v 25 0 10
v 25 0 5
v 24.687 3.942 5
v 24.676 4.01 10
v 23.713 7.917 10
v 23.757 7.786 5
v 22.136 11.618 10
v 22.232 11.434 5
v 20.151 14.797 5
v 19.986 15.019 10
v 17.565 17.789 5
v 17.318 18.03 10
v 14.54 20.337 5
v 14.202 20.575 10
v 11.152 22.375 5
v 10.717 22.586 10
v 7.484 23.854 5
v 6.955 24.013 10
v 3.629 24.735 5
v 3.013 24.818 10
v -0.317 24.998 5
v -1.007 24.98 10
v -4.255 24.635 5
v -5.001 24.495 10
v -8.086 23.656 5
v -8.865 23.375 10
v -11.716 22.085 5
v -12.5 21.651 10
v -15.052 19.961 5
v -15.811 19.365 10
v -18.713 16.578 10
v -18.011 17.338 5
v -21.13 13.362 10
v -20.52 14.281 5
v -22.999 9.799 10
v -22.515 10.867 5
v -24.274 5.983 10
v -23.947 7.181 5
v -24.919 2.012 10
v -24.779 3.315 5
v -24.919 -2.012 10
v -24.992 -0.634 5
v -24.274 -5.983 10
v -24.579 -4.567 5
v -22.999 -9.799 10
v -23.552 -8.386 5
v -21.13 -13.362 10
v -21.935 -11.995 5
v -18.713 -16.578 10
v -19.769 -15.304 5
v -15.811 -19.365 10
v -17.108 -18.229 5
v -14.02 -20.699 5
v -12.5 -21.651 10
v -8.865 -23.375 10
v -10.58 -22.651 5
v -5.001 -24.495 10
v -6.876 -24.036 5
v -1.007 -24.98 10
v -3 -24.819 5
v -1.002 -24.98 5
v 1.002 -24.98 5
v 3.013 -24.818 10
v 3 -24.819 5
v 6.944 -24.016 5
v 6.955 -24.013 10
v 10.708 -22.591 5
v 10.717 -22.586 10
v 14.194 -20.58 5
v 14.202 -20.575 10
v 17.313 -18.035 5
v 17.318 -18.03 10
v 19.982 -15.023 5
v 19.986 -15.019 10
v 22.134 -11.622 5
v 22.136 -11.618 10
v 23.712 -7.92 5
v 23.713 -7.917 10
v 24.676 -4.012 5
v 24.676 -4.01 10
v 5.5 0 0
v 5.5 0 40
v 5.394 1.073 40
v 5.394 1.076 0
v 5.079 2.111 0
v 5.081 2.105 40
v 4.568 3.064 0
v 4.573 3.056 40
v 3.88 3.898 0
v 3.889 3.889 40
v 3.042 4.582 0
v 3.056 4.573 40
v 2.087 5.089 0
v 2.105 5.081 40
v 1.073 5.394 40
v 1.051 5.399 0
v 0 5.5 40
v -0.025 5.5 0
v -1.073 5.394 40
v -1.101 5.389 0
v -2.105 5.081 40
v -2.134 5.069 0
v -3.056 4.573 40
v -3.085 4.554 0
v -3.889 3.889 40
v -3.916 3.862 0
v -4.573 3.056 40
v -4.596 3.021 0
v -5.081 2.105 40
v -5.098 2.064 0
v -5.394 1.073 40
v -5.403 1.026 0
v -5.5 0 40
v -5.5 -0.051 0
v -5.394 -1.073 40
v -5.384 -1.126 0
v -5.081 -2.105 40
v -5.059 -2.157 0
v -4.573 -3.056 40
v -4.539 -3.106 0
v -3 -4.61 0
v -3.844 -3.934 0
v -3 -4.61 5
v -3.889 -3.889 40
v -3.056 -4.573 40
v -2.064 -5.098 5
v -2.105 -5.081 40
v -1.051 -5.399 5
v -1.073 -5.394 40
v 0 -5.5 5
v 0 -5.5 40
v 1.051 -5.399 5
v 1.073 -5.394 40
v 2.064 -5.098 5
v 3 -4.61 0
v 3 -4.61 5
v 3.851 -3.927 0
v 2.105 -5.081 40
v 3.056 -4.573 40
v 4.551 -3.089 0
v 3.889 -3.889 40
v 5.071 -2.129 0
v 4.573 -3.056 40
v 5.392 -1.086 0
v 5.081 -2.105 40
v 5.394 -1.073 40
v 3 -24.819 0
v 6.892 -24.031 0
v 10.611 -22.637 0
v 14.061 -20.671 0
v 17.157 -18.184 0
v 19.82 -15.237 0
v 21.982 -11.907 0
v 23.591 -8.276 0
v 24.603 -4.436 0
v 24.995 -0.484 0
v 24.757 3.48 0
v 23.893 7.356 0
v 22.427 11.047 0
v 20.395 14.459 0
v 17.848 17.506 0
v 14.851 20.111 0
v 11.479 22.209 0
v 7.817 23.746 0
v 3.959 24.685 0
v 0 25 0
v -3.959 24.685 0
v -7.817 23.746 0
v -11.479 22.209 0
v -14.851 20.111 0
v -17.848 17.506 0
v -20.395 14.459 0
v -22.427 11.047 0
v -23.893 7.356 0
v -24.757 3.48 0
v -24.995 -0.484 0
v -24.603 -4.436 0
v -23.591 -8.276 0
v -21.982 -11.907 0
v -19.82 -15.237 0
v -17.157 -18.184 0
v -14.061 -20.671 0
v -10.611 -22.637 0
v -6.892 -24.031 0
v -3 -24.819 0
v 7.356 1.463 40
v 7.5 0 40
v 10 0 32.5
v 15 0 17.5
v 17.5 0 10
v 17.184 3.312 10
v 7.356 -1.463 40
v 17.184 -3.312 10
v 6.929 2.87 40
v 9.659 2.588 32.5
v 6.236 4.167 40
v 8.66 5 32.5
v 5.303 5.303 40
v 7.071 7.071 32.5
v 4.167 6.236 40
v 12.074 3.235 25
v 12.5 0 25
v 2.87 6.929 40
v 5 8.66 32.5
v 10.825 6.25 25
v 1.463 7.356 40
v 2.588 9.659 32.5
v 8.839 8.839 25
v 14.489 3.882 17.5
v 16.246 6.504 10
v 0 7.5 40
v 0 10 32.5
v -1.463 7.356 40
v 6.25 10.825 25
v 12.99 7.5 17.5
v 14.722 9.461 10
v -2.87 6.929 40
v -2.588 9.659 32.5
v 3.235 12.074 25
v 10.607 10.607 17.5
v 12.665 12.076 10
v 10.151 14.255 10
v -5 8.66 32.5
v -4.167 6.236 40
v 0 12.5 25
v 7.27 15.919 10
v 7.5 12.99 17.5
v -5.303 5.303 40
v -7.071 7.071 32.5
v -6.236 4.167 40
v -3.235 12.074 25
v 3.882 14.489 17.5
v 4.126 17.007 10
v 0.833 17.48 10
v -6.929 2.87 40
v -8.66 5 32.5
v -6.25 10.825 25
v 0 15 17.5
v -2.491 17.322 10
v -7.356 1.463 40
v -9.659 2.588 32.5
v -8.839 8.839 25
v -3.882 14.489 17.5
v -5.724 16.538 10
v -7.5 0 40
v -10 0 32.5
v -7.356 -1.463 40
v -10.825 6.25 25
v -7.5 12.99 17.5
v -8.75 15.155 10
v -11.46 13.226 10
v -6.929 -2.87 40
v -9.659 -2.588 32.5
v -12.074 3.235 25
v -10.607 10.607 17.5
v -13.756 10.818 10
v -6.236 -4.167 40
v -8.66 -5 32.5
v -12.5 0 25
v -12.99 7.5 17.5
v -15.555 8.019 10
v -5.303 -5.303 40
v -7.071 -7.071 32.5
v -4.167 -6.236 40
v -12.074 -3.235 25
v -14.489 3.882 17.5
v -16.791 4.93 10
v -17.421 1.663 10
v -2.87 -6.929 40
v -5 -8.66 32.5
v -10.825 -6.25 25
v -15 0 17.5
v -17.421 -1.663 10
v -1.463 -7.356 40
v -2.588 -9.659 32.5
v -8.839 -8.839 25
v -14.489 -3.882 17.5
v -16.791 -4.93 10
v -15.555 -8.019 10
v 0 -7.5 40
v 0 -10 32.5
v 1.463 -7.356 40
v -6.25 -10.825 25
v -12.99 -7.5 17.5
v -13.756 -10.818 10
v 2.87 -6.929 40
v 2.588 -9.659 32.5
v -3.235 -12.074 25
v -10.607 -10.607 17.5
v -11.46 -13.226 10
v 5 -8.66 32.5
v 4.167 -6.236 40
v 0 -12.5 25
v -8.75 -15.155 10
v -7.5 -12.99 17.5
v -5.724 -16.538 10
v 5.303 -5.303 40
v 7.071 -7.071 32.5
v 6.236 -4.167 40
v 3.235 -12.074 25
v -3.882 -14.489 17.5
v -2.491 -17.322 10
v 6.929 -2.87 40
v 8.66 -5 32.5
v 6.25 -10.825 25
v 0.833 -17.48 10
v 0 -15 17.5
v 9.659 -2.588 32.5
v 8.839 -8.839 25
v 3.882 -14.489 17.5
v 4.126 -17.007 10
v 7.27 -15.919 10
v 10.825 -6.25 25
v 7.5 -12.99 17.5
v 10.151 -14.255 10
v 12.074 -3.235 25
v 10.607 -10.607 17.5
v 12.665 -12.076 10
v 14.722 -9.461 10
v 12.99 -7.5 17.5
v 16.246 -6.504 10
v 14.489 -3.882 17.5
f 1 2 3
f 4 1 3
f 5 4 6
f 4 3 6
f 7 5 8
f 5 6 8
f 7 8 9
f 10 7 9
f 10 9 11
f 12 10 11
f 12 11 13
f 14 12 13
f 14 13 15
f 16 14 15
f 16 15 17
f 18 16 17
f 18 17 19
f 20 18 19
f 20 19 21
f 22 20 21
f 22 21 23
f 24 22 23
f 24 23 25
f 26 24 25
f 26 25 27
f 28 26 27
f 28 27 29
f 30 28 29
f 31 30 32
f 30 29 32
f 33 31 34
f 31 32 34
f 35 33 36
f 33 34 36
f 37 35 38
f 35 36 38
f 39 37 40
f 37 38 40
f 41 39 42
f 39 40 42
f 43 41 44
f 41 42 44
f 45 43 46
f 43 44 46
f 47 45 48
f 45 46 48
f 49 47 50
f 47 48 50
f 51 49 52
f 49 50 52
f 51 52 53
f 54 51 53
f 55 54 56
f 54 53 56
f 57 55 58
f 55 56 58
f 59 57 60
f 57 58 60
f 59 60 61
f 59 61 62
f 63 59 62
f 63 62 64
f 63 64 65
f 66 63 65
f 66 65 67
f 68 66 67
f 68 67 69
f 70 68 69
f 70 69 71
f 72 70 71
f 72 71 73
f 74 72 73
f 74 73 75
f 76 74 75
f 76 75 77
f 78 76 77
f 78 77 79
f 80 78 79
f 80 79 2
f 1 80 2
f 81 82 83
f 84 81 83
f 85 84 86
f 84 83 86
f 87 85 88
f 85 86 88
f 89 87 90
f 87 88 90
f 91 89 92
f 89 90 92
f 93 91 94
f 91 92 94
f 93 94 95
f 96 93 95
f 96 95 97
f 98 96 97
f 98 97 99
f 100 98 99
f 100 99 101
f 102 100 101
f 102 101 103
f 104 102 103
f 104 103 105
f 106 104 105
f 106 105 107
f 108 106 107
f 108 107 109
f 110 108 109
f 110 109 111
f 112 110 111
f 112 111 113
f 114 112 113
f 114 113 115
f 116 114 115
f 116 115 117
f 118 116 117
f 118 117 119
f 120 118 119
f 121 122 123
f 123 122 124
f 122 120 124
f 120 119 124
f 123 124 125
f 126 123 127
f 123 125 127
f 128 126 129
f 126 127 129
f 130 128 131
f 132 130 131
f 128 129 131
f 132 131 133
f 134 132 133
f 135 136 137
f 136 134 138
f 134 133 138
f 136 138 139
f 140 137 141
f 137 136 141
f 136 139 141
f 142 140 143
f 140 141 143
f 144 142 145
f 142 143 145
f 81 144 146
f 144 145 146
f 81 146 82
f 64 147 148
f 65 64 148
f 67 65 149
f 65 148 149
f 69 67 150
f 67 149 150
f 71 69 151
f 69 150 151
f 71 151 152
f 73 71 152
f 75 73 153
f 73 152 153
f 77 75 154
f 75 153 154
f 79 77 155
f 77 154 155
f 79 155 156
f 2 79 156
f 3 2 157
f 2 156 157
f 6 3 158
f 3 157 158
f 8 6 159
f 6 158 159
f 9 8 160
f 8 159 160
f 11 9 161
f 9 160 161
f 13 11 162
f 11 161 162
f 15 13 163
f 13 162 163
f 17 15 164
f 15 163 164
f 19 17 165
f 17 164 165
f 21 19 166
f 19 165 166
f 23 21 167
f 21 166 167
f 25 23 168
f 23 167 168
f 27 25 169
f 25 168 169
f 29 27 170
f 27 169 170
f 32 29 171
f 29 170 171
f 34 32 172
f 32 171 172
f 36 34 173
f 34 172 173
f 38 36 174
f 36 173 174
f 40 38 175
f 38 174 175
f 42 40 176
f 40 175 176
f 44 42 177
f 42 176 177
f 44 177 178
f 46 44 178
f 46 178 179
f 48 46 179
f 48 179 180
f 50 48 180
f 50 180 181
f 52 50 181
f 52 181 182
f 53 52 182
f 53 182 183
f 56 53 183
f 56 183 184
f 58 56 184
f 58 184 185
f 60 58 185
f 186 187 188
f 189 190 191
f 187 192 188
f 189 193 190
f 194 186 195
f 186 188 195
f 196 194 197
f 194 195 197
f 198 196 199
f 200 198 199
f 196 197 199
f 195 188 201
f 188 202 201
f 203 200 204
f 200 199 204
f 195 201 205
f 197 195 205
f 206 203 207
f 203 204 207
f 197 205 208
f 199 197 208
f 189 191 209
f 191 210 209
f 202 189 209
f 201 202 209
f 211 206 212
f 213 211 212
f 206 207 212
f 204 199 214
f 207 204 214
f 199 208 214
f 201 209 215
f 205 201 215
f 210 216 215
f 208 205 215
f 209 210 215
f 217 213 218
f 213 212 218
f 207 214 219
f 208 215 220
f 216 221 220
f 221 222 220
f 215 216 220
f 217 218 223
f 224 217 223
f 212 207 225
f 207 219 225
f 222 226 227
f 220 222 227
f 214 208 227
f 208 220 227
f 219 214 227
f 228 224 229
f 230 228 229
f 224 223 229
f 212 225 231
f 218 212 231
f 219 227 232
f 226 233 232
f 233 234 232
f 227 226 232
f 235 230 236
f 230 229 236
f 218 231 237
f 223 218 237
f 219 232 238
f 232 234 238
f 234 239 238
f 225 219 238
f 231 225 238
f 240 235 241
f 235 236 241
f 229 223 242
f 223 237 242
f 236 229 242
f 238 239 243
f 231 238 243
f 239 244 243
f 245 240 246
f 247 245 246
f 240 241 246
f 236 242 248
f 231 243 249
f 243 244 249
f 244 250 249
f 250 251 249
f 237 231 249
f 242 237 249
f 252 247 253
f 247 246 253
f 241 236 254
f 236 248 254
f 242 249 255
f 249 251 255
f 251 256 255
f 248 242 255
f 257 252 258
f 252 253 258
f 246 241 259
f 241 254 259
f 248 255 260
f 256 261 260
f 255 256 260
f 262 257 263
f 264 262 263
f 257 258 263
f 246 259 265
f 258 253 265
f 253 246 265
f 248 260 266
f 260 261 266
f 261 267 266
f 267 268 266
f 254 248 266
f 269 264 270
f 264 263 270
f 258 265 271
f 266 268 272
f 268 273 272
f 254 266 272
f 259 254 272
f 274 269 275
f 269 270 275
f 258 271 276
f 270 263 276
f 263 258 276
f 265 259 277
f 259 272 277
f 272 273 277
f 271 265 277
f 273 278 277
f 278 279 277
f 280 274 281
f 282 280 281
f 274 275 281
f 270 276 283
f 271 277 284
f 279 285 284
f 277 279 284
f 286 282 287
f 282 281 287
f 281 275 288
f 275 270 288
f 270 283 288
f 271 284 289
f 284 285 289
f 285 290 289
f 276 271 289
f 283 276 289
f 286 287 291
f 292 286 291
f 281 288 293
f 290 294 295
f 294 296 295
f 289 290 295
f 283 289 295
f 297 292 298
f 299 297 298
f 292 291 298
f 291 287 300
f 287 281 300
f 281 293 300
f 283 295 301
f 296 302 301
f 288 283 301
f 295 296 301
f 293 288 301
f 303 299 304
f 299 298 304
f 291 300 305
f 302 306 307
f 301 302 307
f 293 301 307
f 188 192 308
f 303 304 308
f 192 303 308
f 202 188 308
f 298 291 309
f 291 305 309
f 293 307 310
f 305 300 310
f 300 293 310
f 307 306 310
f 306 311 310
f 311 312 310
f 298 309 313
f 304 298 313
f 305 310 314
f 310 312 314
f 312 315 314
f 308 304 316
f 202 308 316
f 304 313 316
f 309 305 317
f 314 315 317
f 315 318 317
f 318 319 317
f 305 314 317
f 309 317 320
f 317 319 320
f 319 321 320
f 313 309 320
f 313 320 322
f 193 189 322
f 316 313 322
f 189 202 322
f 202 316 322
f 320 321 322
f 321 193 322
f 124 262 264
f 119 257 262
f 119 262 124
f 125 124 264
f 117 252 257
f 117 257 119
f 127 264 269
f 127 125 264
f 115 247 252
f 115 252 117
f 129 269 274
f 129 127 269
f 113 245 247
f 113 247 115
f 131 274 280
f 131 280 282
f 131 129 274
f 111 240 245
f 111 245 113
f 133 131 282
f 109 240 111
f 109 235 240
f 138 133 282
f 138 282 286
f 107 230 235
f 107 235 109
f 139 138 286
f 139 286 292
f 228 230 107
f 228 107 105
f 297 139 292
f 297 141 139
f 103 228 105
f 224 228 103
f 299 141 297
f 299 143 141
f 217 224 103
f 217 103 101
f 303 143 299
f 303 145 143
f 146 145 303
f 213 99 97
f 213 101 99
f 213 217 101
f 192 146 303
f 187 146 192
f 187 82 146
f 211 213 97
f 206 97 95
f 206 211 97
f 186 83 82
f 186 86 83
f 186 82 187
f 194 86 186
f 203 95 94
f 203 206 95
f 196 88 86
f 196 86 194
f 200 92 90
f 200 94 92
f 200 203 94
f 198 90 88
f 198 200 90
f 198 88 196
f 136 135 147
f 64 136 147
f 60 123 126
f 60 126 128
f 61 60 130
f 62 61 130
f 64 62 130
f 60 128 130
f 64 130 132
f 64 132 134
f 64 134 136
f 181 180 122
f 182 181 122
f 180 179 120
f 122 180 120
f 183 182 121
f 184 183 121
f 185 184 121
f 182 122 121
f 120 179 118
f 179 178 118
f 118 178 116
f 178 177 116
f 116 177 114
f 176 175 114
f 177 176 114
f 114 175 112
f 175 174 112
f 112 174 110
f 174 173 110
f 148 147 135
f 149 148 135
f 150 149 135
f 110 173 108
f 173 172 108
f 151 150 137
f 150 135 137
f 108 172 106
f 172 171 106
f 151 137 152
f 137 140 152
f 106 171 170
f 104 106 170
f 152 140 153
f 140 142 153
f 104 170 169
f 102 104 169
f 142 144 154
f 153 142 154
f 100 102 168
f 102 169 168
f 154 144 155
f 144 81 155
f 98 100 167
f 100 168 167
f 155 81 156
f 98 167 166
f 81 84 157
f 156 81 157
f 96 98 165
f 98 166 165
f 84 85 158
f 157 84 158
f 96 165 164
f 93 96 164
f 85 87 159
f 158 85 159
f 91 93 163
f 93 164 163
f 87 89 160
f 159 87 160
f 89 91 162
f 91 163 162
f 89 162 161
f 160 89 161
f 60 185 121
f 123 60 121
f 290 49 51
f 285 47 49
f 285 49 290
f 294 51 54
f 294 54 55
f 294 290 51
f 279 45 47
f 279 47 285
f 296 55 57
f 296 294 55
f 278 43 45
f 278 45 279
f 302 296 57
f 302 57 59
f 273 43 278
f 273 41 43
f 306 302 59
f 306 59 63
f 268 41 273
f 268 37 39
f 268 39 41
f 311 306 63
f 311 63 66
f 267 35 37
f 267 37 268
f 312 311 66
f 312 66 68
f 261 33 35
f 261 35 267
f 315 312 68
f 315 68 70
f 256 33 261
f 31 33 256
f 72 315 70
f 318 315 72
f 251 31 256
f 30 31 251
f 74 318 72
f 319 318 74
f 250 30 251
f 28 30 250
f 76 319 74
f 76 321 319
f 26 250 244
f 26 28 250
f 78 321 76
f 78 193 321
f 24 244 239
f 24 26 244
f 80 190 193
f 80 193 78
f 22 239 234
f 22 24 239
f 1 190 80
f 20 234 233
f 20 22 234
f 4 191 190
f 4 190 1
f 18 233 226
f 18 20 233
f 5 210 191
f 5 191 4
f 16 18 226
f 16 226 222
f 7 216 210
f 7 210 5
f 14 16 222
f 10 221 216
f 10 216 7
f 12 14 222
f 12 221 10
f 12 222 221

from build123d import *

# Parameters (mm, degrees)
F1_DEPTH = 5
F2_R     = 25
F3_DEPTH = 5
F6_R     = 7.5
F4_R     = 17.5
F8_R     = 5.5
F9_DEPTH = 40


with BuildPart() as f1:
    # F0 (on Top) → F1 (new body)
    with BuildSketch(Plane.XY):
        with BuildLine():
            Line((3, -4.609772), (3, -24.819347))
            ThreePointArc((3, -24.819347), (0, 25), (-3, -24.819347))
            Line((-3, -24.819347), (-3, -4.609772))
            Line((-3, -4.609772), (3, -4.609772))
        make_face()
    extrude(amount=F1_DEPTH)

    # F2 (on face) → F3 (join)
    with BuildSketch(Plane.XY.offset(5)):
        Circle(F2_R)
    extrude(amount=F3_DEPTH)

    # F6 (on offset) → F7 section 0
    with BuildSketch(Plane.XY.offset(40)):
        Circle(F6_R)
    # F4 (on face) → F7 section 1
    with BuildSketch(Plane.XY.offset(10)):
        Circle(F4_R)
    loft()

    # F8 (on face) → F9 (cut, through all)
    with BuildSketch(Plane.XY.offset(40)):
        Circle(F8_R)
    extrude(amount=-F9_DEPTH, mode=Mode.SUBTRACT)


solid = f1.part
